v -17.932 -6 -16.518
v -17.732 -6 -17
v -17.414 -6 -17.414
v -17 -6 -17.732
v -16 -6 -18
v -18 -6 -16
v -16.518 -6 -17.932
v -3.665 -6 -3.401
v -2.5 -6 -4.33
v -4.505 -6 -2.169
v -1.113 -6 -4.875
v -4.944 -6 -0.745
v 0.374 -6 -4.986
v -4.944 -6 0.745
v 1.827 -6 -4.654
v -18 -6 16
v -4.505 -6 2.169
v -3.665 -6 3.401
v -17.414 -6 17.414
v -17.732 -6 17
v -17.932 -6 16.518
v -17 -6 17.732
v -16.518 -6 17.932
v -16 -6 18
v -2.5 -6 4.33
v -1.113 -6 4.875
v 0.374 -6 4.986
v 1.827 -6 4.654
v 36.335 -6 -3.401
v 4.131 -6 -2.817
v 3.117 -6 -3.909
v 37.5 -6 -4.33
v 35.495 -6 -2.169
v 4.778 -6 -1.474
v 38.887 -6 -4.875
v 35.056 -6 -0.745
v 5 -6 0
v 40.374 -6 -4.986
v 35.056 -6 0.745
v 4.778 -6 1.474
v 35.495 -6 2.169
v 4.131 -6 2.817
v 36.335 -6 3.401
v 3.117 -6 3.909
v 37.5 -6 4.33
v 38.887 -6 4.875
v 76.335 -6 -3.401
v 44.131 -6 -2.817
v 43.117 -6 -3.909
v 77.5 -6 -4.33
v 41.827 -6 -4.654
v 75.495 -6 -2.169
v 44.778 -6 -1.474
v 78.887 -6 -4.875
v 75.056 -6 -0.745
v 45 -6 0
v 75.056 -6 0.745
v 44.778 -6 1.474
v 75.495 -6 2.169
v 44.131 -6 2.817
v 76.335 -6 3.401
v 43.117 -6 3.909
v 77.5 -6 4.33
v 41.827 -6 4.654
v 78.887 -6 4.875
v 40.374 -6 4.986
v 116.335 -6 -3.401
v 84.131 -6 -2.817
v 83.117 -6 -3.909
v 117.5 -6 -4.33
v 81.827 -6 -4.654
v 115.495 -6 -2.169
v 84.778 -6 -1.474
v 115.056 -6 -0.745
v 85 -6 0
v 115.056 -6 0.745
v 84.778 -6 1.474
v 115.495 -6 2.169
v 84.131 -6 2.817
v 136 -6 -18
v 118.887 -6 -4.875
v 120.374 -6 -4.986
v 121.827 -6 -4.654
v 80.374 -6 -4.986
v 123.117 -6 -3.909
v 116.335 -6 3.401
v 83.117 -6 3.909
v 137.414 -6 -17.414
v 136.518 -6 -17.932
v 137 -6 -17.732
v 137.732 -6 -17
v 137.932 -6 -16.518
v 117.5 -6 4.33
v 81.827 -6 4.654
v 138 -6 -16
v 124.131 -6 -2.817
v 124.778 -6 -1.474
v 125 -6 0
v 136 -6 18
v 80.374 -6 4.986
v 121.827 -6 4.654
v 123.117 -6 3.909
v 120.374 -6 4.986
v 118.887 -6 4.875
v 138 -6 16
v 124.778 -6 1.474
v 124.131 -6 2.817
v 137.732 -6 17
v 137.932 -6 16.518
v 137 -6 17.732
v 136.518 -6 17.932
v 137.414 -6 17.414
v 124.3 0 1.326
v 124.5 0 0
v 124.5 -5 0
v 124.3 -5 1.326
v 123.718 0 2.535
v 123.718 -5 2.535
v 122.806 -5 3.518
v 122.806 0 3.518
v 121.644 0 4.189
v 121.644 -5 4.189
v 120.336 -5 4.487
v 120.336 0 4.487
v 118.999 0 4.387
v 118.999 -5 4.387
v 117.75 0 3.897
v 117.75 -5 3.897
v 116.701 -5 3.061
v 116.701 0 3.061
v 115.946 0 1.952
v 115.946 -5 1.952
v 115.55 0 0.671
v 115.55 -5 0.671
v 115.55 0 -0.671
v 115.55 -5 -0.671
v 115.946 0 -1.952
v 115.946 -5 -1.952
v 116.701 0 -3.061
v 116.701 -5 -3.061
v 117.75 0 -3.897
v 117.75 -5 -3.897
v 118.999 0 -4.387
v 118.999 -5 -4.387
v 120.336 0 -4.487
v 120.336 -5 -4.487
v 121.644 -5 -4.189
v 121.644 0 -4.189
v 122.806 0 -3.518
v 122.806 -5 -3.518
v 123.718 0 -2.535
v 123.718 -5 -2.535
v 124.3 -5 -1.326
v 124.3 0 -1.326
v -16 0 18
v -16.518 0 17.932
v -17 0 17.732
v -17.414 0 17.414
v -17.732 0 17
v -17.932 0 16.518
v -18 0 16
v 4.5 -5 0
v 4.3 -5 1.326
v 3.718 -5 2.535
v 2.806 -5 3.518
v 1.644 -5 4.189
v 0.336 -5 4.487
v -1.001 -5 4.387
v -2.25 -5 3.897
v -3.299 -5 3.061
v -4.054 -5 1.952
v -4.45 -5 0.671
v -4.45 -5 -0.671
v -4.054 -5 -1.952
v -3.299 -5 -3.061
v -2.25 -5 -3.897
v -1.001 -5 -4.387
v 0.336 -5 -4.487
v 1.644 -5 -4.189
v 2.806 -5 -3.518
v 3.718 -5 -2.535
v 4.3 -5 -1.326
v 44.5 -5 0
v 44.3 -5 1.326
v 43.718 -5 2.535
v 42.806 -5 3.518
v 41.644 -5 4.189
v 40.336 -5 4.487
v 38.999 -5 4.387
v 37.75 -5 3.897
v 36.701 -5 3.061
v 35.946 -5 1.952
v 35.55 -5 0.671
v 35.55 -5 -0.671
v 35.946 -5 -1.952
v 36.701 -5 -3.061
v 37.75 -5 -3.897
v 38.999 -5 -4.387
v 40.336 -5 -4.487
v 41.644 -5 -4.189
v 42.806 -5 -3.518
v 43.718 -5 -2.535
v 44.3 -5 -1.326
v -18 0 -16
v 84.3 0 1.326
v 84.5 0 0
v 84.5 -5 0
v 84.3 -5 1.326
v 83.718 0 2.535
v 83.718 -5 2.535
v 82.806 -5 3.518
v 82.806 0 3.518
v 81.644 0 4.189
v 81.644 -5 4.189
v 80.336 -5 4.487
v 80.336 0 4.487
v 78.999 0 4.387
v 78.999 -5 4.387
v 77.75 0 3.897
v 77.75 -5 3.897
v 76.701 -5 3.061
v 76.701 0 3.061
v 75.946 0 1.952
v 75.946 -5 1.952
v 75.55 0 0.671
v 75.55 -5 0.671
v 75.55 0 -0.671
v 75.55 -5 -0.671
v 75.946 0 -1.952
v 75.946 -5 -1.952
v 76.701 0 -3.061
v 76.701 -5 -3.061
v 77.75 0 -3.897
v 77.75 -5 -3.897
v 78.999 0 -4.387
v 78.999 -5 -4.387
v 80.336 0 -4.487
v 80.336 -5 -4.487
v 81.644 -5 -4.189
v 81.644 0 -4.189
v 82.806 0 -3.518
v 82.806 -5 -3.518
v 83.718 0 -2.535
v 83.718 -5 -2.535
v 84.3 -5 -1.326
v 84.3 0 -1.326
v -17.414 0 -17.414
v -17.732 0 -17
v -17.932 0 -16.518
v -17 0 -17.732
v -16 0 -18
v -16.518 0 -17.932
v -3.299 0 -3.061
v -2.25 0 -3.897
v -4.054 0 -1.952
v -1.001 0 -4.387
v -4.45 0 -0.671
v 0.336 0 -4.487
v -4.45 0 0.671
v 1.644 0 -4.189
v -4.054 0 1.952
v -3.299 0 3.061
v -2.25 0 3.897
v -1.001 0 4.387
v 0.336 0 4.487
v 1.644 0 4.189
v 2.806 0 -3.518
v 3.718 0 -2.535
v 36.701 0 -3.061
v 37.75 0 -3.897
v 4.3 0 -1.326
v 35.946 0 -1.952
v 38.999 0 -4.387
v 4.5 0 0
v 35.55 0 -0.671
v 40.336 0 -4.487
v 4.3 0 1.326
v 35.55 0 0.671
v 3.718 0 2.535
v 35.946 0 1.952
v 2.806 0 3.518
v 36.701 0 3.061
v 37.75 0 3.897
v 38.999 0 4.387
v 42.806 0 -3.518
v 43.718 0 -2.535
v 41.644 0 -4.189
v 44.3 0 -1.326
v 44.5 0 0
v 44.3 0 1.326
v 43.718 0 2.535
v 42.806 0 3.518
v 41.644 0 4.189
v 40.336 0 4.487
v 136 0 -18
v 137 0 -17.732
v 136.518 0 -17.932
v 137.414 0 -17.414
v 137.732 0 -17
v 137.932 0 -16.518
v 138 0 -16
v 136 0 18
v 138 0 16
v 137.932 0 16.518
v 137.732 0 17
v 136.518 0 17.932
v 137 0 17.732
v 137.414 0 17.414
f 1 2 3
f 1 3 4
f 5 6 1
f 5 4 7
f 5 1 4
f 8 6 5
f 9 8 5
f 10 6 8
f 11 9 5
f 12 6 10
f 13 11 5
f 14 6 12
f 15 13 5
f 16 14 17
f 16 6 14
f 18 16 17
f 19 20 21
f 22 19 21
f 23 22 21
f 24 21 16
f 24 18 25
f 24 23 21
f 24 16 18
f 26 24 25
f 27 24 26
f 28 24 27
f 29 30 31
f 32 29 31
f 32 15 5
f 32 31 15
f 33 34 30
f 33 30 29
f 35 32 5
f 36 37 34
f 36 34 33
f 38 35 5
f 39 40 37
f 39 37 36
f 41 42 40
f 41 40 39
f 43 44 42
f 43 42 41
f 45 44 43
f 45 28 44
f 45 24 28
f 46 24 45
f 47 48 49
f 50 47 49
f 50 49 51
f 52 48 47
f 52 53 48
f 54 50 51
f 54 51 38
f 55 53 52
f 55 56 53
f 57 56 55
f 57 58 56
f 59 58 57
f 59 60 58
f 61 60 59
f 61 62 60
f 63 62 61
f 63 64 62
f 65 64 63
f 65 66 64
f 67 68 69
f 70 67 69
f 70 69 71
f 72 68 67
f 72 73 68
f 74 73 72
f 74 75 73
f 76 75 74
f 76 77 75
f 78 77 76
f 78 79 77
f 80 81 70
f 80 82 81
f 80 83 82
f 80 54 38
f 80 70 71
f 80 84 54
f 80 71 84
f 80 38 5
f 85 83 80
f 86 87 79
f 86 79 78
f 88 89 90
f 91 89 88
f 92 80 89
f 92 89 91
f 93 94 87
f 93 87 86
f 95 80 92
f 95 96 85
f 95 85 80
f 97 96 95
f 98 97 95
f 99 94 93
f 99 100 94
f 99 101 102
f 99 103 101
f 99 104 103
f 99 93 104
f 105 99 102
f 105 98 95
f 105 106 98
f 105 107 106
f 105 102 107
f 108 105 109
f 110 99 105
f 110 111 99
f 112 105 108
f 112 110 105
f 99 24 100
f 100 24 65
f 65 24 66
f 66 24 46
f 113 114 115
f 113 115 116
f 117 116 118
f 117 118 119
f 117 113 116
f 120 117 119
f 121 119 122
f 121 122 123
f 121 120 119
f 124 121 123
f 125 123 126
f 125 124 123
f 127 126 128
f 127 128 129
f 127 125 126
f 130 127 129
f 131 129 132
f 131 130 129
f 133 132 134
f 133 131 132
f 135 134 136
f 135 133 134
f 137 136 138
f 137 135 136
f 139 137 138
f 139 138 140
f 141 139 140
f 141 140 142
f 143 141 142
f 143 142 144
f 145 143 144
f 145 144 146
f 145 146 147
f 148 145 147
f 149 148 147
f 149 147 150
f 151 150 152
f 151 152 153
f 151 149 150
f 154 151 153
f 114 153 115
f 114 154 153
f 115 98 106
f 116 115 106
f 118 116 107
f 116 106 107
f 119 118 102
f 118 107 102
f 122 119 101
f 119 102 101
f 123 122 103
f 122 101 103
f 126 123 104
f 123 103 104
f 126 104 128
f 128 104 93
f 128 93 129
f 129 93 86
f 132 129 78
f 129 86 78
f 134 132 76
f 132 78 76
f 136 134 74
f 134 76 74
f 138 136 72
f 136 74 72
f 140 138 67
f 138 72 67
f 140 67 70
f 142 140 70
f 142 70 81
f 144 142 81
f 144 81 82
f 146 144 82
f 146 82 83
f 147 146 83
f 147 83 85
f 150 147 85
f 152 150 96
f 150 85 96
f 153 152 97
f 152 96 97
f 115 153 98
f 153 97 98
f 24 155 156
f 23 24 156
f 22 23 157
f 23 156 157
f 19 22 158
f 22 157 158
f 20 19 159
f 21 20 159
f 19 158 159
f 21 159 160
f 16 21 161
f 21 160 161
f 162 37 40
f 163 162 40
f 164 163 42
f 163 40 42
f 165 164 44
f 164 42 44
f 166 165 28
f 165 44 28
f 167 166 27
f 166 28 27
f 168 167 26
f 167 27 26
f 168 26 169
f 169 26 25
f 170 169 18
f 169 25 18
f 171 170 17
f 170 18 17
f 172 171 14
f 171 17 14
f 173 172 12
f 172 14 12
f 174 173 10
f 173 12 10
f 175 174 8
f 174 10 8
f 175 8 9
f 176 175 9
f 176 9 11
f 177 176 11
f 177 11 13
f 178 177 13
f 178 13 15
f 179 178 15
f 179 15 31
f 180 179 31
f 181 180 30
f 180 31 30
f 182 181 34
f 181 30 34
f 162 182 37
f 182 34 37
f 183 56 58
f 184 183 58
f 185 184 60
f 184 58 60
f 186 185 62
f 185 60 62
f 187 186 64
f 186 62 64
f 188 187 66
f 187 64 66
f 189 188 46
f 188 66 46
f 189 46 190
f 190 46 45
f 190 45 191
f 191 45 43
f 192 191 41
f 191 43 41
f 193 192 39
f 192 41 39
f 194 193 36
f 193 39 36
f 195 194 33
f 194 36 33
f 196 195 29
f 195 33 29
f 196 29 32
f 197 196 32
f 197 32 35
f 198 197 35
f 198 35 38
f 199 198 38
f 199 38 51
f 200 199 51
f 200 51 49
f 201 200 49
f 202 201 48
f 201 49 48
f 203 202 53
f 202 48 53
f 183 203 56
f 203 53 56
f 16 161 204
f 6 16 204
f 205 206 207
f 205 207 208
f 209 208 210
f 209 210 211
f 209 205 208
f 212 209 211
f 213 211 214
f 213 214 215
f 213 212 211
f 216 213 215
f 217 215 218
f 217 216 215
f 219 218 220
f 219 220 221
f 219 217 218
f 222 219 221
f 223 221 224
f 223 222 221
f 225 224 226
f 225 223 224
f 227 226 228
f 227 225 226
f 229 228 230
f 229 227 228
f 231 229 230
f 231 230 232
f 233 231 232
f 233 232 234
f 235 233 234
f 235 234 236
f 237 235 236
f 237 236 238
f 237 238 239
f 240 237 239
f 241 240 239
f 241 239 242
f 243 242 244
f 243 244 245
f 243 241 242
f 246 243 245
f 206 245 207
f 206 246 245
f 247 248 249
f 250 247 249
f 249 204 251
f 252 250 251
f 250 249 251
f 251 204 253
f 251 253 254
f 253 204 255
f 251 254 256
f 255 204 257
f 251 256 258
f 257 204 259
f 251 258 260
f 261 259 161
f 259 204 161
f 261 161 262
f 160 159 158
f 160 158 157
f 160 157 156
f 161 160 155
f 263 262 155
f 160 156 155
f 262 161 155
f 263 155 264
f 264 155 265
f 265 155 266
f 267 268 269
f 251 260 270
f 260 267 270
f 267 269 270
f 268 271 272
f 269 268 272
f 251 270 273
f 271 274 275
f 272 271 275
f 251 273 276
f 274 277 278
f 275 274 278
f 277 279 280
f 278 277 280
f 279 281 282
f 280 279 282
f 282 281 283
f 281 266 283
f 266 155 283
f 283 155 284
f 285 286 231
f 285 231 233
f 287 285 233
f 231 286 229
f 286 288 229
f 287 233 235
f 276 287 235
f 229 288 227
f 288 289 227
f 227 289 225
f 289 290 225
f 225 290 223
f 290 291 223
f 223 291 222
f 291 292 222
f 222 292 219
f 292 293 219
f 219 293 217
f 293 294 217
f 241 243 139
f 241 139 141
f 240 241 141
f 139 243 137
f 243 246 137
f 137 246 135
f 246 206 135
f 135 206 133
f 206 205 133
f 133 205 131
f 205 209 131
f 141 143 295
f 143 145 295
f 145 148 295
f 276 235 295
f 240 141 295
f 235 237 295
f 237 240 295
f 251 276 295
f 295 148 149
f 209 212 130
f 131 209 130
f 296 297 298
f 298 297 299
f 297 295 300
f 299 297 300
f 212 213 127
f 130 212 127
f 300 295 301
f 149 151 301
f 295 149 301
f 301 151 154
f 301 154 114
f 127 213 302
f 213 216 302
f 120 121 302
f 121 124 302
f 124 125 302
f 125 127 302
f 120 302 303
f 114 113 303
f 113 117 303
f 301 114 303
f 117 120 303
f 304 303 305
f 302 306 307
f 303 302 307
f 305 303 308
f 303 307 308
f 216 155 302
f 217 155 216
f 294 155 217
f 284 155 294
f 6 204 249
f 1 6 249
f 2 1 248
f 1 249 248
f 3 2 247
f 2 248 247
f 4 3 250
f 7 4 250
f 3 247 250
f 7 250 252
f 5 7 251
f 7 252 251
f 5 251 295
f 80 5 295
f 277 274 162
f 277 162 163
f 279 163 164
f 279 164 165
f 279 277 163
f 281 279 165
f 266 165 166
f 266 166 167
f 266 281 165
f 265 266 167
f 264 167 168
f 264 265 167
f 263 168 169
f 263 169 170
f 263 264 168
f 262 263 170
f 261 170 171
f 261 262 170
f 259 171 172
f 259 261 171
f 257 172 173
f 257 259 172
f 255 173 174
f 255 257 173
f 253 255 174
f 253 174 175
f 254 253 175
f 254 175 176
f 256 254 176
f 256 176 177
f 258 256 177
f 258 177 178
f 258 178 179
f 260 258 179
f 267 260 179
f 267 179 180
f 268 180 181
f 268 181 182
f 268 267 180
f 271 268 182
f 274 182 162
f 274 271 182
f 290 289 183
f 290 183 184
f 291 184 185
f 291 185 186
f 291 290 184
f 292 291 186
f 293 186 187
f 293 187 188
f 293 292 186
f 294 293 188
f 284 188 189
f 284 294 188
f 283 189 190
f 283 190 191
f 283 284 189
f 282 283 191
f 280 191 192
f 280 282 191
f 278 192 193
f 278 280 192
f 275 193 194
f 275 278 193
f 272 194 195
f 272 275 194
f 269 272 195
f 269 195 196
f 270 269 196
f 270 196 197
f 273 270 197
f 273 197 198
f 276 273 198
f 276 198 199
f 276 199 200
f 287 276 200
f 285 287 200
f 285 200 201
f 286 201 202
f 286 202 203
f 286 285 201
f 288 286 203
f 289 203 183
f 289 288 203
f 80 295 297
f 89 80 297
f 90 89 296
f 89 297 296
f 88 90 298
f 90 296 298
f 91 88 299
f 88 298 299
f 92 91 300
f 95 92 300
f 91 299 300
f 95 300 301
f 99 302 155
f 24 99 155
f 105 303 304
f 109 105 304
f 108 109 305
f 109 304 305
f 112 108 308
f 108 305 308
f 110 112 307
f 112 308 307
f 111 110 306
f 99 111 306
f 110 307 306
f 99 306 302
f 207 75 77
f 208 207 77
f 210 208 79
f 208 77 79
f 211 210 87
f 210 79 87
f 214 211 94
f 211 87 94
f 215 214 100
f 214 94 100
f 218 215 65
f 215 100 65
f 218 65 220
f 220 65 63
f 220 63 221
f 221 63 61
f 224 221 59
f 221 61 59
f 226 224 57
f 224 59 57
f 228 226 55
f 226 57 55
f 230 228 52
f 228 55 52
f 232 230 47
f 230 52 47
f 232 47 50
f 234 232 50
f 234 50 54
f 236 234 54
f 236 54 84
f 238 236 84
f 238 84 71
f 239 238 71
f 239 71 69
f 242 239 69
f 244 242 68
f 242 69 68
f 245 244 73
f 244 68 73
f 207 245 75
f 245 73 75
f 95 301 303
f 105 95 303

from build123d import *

# Parameters (mm, degrees)
F0_R     = 4.5
F1_DEPTH = 6
F2_SIZE2 = 0.5
F2_SIZE  = 1


with BuildPart() as f1:
    # F0 (on Front) → F1 (new body)
    with BuildSketch(Plane.XZ):
        with BuildLine():
            Line((136, 18), (-16, 18))
            ThreePointArc((-16, 18), (-17.414214, 17.414214), (-18, 16))
            Line((-18, 16), (-18, -16))
            ThreePointArc((-18, -16), (-17.414214, -17.414214), (-16, -18))
            Line((-16, -18), (136, -18))
            ThreePointArc((136, -18), (137.414214, -17.414214), (138, -16))
            Line((138, -16), (138, 16))
            ThreePointArc((138, 16), (137.414214, 17.414214), (136, 18))
        make_face()
        Circle(F0_R, mode=Mode.SUBTRACT)
        with Locations((40, 0)):
            Circle(F0_R, mode=Mode.SUBTRACT)
        with Locations((80, 0)):
            Circle(F0_R, mode=Mode.SUBTRACT)
        with Locations((120, 0)):
            Circle(F0_R, mode=Mode.SUBTRACT)
    extrude(amount=F1_DEPTH)

    # F2
    f2_edges = [f1.edges().sort_by_distance(p)[0] for p in [
        (-4.5, -6, 0),
        (35.5, -6, 0),
        (75.5, -6, 0),
        (115.5, -6, 0),
    ]]
    chamfer(f2_edges, length=F2_SIZE, length2=F2_SIZE2)


solid = f1.part
